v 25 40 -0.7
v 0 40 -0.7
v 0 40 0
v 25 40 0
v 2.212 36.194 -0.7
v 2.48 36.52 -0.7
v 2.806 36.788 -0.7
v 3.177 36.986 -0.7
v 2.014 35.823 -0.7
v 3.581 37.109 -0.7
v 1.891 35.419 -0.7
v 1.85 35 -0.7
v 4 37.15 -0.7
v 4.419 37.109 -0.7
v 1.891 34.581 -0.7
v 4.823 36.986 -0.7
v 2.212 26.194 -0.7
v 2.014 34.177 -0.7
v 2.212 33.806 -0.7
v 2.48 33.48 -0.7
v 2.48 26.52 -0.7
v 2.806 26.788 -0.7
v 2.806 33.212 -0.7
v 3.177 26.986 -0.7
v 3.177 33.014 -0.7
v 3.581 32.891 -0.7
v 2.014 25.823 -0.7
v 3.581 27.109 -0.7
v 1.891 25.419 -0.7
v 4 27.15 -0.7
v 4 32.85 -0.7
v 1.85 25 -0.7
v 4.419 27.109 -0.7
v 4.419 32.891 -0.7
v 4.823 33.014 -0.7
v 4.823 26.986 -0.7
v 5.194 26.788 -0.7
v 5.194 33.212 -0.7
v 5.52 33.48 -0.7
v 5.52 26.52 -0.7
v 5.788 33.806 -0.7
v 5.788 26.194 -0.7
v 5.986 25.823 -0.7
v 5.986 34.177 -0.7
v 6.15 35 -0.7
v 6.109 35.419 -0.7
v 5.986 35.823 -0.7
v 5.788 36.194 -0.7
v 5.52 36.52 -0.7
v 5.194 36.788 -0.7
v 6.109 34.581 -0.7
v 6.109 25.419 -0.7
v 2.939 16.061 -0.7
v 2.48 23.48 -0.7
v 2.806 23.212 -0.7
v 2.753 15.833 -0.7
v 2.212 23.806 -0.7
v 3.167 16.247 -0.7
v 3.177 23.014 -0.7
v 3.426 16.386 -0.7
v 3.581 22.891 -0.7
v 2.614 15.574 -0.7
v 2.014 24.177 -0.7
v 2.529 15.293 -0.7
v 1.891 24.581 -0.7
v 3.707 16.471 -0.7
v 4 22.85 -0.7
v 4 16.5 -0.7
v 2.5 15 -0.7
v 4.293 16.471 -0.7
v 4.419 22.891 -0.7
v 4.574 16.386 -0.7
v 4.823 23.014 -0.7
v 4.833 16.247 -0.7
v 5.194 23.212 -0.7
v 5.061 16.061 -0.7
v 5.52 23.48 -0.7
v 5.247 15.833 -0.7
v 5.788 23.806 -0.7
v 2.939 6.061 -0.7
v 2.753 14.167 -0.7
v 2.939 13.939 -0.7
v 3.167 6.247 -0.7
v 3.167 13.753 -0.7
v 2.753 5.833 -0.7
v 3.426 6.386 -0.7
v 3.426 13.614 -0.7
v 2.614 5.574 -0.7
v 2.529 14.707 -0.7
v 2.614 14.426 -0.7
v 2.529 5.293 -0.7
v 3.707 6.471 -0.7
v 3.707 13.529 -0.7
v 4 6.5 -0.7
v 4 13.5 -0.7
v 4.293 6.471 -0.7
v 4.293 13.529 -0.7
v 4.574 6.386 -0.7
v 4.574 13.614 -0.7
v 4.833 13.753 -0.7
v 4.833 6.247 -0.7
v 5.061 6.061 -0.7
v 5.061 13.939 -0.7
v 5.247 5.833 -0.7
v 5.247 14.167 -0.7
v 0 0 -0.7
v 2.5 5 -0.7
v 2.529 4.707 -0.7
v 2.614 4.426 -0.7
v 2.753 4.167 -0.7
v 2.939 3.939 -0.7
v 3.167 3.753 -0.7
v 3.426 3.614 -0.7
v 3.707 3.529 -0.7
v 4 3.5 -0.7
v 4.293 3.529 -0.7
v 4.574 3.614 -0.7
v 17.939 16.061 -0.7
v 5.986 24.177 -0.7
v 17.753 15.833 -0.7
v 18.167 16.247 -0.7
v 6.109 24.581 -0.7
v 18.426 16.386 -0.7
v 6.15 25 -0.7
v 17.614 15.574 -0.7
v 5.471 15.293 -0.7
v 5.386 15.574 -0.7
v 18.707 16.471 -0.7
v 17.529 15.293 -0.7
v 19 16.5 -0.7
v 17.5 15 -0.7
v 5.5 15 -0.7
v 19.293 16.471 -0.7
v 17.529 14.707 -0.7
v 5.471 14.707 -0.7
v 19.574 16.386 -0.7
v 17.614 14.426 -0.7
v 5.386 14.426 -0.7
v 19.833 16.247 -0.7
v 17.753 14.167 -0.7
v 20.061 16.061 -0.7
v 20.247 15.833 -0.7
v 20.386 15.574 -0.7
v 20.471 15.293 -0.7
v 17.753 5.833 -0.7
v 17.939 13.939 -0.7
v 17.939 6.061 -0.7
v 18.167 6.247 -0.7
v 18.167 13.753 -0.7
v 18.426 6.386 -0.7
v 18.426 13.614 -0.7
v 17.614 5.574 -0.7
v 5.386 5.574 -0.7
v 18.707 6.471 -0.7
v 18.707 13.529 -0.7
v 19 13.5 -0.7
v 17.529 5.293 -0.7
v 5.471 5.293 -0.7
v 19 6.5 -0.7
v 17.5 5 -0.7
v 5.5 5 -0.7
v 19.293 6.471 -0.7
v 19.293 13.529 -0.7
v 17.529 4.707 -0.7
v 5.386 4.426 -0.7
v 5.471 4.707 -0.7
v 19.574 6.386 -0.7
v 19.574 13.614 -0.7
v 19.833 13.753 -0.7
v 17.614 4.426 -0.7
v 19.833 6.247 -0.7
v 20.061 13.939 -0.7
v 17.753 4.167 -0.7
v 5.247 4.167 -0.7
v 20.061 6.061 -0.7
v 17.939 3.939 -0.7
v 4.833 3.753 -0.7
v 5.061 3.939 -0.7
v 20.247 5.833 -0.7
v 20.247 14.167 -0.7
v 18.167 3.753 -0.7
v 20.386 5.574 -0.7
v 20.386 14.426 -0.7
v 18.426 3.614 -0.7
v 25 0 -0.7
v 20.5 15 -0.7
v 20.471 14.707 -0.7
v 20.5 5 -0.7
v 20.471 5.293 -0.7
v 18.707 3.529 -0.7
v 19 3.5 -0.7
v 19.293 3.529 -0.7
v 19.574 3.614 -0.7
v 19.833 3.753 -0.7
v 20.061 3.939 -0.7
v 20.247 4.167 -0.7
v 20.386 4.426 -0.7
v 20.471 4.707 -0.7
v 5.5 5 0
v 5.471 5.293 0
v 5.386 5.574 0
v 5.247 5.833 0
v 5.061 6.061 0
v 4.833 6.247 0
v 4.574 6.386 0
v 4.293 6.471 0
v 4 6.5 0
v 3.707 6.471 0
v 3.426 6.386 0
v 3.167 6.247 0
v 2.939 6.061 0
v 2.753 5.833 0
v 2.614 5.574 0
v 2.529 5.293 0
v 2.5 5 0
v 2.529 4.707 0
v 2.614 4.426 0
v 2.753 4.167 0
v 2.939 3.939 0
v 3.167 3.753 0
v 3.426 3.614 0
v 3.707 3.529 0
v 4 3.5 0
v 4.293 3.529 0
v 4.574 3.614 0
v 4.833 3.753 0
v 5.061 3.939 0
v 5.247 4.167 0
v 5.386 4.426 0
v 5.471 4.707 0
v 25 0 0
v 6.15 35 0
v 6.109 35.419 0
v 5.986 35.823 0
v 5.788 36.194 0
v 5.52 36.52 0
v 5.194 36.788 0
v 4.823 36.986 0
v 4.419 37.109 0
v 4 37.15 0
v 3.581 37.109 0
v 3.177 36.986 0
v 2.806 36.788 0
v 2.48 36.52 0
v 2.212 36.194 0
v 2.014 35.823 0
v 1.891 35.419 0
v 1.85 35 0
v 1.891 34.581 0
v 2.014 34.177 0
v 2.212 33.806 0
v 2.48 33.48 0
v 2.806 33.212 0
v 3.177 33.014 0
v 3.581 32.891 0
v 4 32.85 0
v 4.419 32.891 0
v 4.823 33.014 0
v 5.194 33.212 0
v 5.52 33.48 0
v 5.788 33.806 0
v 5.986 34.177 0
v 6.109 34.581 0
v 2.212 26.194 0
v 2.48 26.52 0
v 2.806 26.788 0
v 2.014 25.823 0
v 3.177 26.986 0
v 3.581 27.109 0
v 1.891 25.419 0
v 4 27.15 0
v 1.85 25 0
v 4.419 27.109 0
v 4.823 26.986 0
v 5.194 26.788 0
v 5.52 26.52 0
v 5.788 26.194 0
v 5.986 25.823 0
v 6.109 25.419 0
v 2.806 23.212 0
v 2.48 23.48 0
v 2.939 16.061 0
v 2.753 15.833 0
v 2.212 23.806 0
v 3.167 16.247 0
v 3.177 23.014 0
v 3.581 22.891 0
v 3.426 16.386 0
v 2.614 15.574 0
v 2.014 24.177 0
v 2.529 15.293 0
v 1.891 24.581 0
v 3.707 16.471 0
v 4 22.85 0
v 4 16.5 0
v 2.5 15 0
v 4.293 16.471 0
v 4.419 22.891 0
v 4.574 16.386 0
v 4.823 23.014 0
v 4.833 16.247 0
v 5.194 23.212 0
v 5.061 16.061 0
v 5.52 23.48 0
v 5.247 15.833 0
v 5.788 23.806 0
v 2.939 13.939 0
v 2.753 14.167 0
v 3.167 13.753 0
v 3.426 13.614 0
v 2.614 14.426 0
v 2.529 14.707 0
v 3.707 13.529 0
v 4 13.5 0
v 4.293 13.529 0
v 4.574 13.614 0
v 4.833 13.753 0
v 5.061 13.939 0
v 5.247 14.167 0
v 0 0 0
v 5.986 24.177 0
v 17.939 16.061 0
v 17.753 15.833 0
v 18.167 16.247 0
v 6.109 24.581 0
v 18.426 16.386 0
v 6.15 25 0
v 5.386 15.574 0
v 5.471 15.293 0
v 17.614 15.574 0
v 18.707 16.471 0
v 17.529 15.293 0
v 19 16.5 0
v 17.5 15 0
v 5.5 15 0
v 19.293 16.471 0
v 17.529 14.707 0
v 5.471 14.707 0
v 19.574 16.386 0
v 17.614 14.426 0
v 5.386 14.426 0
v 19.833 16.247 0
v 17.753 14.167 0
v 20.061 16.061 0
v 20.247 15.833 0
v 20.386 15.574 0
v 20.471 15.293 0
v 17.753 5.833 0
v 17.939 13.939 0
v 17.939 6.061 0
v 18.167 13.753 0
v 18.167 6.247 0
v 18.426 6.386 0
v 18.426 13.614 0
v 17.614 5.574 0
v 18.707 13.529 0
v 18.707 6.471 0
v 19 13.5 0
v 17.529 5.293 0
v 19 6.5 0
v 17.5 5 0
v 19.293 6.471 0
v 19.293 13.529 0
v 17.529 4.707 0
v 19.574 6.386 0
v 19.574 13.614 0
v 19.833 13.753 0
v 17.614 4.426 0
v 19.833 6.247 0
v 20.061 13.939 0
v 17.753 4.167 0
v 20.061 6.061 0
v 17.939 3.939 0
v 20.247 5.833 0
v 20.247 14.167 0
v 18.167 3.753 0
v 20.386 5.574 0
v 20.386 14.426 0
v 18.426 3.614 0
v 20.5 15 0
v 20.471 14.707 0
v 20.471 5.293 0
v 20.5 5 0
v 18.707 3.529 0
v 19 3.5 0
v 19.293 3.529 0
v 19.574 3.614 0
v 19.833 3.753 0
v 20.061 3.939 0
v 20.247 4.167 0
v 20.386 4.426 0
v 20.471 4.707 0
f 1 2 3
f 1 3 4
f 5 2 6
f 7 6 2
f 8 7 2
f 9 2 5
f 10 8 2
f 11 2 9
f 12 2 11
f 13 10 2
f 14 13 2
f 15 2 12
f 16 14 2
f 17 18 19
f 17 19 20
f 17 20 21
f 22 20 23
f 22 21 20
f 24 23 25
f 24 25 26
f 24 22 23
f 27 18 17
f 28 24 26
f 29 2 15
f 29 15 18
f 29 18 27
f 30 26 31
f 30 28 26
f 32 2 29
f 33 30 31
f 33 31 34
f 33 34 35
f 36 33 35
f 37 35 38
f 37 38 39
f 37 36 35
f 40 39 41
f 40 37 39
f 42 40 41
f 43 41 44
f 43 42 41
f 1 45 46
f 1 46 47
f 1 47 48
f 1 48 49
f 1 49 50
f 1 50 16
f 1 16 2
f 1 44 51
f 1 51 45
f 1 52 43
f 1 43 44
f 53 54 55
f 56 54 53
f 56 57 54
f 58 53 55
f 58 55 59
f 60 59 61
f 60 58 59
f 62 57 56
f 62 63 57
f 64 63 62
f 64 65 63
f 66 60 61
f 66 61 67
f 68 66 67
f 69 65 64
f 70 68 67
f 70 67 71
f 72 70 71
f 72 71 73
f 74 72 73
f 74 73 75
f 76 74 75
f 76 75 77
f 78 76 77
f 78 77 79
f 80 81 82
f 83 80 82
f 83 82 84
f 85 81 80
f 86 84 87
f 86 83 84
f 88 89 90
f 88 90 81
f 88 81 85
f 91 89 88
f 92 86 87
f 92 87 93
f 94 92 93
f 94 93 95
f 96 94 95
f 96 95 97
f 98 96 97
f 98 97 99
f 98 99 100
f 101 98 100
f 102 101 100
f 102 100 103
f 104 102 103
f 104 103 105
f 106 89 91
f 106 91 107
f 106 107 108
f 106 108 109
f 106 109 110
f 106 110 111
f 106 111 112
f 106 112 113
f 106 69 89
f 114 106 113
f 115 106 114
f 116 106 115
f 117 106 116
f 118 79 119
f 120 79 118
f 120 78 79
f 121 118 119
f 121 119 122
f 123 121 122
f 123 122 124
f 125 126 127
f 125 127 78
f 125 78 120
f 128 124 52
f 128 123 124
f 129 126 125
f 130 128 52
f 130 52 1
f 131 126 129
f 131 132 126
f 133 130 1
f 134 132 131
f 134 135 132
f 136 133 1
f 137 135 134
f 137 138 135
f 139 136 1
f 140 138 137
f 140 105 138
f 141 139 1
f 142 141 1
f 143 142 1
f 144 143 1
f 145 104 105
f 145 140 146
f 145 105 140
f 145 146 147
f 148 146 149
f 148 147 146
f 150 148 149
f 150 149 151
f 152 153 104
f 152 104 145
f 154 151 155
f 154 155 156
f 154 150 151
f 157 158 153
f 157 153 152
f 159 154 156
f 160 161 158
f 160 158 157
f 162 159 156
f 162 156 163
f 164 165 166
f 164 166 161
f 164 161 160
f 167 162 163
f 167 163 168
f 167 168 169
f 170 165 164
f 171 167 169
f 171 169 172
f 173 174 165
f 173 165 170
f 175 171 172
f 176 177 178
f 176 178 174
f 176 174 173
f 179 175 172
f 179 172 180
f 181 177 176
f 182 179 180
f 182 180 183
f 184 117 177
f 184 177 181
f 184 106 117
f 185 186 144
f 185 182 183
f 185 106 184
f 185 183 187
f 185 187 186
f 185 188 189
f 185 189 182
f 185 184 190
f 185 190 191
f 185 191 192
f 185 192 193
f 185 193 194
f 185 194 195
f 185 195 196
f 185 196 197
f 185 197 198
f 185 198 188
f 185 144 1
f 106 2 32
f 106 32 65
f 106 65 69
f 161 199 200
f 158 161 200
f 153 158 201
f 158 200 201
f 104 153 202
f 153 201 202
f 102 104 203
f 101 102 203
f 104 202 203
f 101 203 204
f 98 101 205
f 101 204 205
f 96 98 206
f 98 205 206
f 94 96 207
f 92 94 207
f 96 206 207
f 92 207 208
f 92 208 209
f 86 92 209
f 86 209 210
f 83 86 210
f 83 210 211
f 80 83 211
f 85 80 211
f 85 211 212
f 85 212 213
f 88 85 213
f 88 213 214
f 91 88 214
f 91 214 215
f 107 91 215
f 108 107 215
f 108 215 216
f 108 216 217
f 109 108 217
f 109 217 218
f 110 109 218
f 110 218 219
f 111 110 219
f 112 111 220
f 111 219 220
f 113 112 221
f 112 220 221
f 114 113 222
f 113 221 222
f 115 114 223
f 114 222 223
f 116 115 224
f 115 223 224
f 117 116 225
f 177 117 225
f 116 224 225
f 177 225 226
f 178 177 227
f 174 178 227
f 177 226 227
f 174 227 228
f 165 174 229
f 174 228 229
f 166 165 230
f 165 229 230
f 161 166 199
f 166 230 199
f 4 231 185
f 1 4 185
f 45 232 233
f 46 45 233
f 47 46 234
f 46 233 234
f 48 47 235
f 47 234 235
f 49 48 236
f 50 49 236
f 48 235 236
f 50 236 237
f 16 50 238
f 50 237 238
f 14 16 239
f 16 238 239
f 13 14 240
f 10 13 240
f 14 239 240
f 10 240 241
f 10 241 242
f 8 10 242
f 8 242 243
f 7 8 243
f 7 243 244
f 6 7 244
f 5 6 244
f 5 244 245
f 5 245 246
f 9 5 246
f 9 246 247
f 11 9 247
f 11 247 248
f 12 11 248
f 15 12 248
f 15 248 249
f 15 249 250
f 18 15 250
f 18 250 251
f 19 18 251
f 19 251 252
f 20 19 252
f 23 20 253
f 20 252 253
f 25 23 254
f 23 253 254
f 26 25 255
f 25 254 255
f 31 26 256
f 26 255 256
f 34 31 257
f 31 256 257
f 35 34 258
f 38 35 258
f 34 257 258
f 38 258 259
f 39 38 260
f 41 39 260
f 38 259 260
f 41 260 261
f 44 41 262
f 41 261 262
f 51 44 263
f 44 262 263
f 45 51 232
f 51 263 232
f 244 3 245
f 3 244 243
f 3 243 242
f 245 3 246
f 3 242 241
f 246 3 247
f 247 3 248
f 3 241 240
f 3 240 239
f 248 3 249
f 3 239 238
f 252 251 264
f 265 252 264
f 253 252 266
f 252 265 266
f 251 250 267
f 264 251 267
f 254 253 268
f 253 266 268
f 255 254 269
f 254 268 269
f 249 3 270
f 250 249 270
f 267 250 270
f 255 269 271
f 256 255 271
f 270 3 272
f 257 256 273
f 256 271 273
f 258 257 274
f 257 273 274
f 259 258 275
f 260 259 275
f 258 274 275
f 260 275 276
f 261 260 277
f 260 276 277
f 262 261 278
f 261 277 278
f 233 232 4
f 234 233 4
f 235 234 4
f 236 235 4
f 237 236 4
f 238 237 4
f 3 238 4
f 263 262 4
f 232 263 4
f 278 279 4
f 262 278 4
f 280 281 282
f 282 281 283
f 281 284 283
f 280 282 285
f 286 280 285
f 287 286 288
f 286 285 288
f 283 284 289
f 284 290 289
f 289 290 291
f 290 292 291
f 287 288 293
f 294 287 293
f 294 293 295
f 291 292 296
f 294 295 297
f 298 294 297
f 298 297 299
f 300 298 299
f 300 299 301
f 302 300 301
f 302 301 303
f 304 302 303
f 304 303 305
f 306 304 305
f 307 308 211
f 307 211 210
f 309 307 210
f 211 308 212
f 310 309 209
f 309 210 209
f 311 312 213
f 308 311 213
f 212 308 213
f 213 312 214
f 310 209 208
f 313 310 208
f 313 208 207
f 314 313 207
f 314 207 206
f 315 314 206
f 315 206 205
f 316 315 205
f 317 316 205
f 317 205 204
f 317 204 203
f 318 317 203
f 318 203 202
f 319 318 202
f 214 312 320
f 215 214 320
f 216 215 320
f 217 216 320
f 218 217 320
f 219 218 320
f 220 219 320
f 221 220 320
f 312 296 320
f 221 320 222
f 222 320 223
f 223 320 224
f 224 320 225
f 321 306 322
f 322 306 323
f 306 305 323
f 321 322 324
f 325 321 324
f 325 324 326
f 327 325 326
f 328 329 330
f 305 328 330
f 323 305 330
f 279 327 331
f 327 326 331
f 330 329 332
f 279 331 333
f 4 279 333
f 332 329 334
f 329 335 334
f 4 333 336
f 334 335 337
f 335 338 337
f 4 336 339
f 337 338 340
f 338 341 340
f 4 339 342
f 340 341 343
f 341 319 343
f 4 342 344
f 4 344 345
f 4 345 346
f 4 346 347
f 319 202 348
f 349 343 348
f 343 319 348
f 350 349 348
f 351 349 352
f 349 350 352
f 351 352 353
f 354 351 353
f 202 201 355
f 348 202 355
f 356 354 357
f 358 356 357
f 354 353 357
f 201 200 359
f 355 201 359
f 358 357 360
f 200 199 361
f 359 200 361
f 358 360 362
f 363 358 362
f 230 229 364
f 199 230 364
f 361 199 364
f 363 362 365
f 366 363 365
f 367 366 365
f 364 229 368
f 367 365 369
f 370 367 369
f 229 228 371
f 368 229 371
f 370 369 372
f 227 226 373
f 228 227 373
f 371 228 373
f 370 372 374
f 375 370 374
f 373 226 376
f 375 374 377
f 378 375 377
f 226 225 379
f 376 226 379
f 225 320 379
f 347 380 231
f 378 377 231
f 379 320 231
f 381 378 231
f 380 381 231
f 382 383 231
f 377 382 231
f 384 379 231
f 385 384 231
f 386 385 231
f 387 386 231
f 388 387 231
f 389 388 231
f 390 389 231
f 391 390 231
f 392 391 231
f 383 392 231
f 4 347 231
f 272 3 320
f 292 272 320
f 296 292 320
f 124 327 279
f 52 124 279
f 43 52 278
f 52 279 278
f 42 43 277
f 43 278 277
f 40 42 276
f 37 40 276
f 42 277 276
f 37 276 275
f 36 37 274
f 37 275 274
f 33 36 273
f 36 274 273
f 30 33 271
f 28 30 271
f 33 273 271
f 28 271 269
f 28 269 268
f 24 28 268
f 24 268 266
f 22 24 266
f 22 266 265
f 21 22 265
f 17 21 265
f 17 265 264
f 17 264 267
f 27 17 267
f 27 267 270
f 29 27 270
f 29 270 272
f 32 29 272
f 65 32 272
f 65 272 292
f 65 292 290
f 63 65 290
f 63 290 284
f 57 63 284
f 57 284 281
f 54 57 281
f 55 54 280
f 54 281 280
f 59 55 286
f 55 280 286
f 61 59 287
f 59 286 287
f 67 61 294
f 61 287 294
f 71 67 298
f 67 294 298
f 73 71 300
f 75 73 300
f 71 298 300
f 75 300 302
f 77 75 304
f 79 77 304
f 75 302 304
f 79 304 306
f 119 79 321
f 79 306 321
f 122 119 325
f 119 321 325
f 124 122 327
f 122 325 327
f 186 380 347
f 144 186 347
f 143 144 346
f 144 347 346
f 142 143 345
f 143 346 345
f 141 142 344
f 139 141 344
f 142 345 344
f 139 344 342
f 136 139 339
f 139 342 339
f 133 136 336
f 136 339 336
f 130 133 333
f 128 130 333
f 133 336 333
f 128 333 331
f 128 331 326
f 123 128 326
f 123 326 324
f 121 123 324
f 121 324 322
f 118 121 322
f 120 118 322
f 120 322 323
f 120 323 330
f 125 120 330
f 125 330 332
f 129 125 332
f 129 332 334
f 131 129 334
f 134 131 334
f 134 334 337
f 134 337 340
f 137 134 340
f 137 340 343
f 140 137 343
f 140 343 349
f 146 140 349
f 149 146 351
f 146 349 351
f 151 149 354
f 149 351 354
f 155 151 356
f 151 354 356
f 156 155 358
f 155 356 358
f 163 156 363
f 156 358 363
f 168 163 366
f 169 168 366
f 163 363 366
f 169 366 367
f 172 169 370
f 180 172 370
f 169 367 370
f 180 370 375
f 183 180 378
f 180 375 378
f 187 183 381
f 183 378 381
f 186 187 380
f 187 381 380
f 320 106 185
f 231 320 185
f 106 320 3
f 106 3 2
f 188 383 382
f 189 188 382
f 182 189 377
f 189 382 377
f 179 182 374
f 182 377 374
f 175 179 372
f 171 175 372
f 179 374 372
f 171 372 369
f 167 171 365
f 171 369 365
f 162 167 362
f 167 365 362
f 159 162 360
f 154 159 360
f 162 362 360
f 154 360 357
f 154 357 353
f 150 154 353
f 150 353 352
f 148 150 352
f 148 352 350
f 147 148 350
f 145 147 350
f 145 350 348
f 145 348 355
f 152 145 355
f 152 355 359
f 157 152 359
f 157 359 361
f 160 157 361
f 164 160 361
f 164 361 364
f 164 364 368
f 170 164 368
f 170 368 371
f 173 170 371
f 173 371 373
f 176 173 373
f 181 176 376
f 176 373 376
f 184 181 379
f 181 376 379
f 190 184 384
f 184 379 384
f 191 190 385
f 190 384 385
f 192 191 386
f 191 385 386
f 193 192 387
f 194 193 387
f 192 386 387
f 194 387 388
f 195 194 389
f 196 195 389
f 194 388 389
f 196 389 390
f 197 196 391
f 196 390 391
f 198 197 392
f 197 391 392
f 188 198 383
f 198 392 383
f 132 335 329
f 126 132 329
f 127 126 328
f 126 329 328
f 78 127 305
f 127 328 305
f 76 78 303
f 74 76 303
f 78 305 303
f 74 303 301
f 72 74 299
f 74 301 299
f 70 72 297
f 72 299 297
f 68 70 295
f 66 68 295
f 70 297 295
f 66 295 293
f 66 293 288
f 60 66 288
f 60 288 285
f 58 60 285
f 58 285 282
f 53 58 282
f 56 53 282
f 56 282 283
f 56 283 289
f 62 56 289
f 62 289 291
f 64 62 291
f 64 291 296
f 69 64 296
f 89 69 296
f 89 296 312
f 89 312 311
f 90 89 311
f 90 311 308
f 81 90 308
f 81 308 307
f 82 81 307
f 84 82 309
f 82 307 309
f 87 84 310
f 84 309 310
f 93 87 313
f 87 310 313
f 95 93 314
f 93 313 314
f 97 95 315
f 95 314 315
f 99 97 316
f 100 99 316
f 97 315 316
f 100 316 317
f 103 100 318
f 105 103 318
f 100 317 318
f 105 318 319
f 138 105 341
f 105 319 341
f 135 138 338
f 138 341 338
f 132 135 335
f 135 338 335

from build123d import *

# Parameters (mm, degrees)
SKETCH1_W           = 25
SKETCH1_H           = 0.7
BOSS_EXTRUDE1_DEPTH = 40
SKETCH2_R           = 2.15
SKETCH2_R_2         = 1.5
CUT_EXTRUDE1_DEPTH  = 40


with BuildPart() as part:
    # Sketch1 → Boss-Extrude1 (new body)
    with BuildSketch(Plane(origin=(0, 0, 0), x_dir=(1, 0, 0), z_dir=(0, 1, 0))):
        with Locations((12.5, 0.35)):
            Rectangle(SKETCH1_W, SKETCH1_H)
    extrude(amount=BOSS_EXTRUDE1_DEPTH)

    # Sketch2 → Cut-Extrude1 (cut)
    with BuildSketch(Plane.XY):
        with Locations((4, 35)):
            Circle(SKETCH2_R)
        with Locations((4, 25)):
            Circle(SKETCH2_R)
        with Locations((4, 15)):
            Circle(SKETCH2_R_2)
        with Locations((4, 5)):
            Circle(SKETCH2_R_2)
        with Locations((19, 15)):
            Circle(SKETCH2_R_2)
        with Locations((19, 5)):
            Circle(SKETCH2_R_2)
    extrude(amount=-CUT_EXTRUDE1_DEPTH, mode=Mode.SUBTRACT)


solid = part.part
